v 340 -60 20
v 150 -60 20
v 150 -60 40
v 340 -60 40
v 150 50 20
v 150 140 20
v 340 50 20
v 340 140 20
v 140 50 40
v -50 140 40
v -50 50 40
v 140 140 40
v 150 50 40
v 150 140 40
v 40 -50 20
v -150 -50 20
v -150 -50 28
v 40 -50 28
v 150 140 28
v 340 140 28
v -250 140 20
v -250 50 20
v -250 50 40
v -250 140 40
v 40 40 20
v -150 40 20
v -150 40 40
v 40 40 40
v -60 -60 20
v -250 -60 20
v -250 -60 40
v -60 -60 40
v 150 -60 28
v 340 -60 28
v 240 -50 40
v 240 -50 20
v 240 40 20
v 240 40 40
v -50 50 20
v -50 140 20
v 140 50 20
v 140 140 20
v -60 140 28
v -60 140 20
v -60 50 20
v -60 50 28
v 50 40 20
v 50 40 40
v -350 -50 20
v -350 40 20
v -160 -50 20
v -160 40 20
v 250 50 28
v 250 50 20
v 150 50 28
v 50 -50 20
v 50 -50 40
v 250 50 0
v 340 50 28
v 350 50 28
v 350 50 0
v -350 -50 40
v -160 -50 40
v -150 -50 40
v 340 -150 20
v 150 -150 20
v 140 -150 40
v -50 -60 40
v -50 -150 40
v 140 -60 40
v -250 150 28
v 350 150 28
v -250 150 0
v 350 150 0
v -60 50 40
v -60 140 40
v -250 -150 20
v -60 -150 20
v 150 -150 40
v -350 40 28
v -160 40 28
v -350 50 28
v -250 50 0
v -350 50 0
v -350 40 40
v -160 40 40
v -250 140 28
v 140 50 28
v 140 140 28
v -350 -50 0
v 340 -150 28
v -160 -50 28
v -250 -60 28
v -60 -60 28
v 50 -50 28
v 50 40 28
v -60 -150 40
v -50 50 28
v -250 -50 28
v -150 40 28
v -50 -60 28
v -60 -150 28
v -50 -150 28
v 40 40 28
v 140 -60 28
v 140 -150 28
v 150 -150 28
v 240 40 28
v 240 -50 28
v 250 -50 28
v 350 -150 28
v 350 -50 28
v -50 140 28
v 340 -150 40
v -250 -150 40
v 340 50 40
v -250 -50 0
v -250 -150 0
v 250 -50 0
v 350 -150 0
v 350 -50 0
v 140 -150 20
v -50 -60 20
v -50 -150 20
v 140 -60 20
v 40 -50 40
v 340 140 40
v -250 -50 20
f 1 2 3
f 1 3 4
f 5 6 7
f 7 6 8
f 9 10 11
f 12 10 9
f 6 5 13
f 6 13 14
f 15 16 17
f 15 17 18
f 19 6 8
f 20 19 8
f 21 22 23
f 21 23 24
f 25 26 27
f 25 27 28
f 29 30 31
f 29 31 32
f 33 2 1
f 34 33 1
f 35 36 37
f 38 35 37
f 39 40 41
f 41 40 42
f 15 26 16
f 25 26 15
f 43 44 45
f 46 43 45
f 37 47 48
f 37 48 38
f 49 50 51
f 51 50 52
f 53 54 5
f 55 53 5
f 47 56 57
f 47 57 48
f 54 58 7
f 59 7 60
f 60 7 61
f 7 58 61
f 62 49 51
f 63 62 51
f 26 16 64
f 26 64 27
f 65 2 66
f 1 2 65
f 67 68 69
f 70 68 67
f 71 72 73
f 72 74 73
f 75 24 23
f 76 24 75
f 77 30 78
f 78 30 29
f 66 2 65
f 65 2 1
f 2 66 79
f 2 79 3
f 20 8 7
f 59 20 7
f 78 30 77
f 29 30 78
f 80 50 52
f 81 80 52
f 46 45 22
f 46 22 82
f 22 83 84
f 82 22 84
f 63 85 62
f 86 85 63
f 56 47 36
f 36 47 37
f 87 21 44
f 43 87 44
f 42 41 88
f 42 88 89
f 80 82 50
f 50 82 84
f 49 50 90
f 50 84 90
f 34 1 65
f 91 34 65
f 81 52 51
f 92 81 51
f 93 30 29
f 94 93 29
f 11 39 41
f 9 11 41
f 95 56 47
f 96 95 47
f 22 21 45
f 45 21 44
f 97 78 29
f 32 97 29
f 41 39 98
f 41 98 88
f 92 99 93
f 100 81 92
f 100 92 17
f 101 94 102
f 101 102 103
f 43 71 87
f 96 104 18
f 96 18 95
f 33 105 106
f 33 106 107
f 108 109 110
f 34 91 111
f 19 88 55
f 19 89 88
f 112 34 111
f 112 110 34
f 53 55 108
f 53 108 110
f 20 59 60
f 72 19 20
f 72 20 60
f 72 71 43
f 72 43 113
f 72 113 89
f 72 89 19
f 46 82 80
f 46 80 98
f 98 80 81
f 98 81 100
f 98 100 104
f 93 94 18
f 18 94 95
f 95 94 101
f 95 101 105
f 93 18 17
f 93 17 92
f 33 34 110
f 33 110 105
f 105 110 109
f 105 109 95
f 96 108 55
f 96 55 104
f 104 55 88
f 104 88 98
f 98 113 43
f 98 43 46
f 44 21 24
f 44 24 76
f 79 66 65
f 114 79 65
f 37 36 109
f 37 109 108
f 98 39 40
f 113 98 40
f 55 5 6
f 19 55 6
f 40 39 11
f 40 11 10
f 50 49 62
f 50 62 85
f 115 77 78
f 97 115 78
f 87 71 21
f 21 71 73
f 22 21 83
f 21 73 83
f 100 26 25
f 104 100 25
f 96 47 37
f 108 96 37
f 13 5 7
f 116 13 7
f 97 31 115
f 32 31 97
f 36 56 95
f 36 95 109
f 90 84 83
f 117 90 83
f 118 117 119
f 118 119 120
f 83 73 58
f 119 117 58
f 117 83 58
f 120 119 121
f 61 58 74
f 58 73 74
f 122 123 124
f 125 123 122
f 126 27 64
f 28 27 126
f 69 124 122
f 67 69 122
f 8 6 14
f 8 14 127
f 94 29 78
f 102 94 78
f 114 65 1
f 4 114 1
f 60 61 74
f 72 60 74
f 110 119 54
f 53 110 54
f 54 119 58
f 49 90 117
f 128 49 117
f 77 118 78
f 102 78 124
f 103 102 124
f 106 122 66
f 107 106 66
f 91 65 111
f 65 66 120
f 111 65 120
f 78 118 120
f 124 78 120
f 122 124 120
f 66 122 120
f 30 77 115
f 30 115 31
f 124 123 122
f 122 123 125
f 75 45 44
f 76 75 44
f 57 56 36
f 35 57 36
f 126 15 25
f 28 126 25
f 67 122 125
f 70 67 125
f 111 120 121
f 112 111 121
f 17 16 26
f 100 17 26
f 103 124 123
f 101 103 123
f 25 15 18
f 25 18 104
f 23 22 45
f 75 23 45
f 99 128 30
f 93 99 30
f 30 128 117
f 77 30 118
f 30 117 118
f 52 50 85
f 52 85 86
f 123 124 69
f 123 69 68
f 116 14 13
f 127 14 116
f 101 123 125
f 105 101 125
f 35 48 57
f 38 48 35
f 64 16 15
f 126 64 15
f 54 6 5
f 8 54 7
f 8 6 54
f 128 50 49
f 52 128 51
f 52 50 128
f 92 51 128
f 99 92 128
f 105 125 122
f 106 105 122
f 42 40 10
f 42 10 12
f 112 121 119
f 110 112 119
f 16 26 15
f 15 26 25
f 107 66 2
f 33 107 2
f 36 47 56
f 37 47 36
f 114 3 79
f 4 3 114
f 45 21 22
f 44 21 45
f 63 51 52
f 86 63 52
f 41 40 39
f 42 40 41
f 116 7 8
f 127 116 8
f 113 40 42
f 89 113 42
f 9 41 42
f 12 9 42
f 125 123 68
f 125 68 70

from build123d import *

# Parameters (mm, degrees)
F1_DEPTH = 20
F2_W     = 190
F2_H     = 90
F3_DEPTH = 20
F4_W     = 190
F4_H     = 90
F5_DEPTH = 8


with BuildPart() as f1:
    # F0 (on Top) → F1 (new body)
    with BuildSketch(Plane.XY):
        Polygon((-250, -150), (350, -150), (350, -50), (250, -50), (250, 50), (350, 50), (350, 150), (-250, 150), (-250, 50), (-350, 50), (-350, -50), (-250, -50), align=None)
    extrude(amount=F1_DEPTH)

    # F4 (on face) → F5 (join)
    with BuildSketch(Plane.XY.offset(20)):
        Polygon((350, 50), (350, 150), (-250, 150), (-250, 140), (-60, 140), (-60, 50), (-250, 50), (-350, 50), (-350, 40), (-160, 40), (-160, -50), (-250, -50), (-250, -60), (-60, -60), (-60, -150), (-50, -150), (-50, -60), (140, -60), (140, -150), (150, -150), (150, -60), (340, -60), (340, -150), (350, -150), (350, -50), (250, -50), (250, 50), (150, 50), (150, 140), (340, 140), (340, 50), align=None)
        with Locations((-55, -5)):
            Rectangle(F4_W, F4_H, mode=Mode.SUBTRACT)
        with Locations((145, -5)):
            Rectangle(F4_W, F4_H, mode=Mode.SUBTRACT)
        with Locations((45, 95)):
            Rectangle(F4_W, F4_H, mode=Mode.SUBTRACT)
    extrude(amount=F5_DEPTH)


with BuildPart() as f3:
    # F2 (on face) → F3 (new body)
    with BuildSketch(Plane.XY.offset(20)):
        with Locations((-255, -5)):
            Rectangle(F2_W, F2_H)
    extrude(amount=F3_DEPTH)


with BuildPart() as f3b:
    # F2 (on face) → F3, piece 2 (new body)
    with BuildSketch(Plane.XY.offset(20)):
        with Locations((-55, -5)):
            Rectangle(F2_W, F2_H)
    extrude(amount=F3_DEPTH)


with BuildPart() as f3c:
    # F2 (on face) → F3, piece 3 (new body)
    with BuildSketch(Plane.XY.offset(20)):
        with Locations((145, -5)):
            Rectangle(F2_W, F2_H)
    extrude(amount=F3_DEPTH)


with BuildPart() as f3d:
    # F2 (on face) → F3, piece 4 (new body)
    with BuildSketch(Plane.XY.offset(20)):
        with Locations((-155, 95)):
            Rectangle(F2_W, F2_H)
    extrude(amount=F3_DEPTH)


with BuildPart() as f3e:
    # F2 (on face) → F3, piece 5 (new body)
    with BuildSketch(Plane.XY.offset(20)):
        with Locations((45, 95)):
            Rectangle(F2_W, F2_H)
    extrude(amount=F3_DEPTH)


with BuildPart() as f3f:
    # F2 (on face) → F3, piece 6 (new body)
    with BuildSketch(Plane.XY.offset(20)):
        with Locations((245, 95)):
            Rectangle(F2_W, F2_H)
    extrude(amount=F3_DEPTH)


with BuildPart() as f3g:
    # F2 (on face) → F3, piece 7 (new body)
    with BuildSketch(Plane.XY.offset(20)):
        with Locations((-155, -105)):
            Rectangle(F2_W, F2_H)
    extrude(amount=F3_DEPTH)


with BuildPart() as f3h:
    # F2 (on face) → F3, piece 8 (new body)
    with BuildSketch(Plane.XY.offset(20)):
        with Locations((45, -105)):
            Rectangle(F2_W, F2_H)
    extrude(amount=F3_DEPTH)


with BuildPart() as f3i:
    # F2 (on face) → F3, piece 9 (new body)
    with BuildSketch(Plane.XY.offset(20)):
        with Locations((245, -105)):
            Rectangle(F2_W, F2_H)
    extrude(amount=F3_DEPTH)


solid = Compound([f1.part, f3.part, f3b.part, f3c.part, f3d.part, f3e.part, f3f.part, f3g.part, f3h.part, f3i.part])
